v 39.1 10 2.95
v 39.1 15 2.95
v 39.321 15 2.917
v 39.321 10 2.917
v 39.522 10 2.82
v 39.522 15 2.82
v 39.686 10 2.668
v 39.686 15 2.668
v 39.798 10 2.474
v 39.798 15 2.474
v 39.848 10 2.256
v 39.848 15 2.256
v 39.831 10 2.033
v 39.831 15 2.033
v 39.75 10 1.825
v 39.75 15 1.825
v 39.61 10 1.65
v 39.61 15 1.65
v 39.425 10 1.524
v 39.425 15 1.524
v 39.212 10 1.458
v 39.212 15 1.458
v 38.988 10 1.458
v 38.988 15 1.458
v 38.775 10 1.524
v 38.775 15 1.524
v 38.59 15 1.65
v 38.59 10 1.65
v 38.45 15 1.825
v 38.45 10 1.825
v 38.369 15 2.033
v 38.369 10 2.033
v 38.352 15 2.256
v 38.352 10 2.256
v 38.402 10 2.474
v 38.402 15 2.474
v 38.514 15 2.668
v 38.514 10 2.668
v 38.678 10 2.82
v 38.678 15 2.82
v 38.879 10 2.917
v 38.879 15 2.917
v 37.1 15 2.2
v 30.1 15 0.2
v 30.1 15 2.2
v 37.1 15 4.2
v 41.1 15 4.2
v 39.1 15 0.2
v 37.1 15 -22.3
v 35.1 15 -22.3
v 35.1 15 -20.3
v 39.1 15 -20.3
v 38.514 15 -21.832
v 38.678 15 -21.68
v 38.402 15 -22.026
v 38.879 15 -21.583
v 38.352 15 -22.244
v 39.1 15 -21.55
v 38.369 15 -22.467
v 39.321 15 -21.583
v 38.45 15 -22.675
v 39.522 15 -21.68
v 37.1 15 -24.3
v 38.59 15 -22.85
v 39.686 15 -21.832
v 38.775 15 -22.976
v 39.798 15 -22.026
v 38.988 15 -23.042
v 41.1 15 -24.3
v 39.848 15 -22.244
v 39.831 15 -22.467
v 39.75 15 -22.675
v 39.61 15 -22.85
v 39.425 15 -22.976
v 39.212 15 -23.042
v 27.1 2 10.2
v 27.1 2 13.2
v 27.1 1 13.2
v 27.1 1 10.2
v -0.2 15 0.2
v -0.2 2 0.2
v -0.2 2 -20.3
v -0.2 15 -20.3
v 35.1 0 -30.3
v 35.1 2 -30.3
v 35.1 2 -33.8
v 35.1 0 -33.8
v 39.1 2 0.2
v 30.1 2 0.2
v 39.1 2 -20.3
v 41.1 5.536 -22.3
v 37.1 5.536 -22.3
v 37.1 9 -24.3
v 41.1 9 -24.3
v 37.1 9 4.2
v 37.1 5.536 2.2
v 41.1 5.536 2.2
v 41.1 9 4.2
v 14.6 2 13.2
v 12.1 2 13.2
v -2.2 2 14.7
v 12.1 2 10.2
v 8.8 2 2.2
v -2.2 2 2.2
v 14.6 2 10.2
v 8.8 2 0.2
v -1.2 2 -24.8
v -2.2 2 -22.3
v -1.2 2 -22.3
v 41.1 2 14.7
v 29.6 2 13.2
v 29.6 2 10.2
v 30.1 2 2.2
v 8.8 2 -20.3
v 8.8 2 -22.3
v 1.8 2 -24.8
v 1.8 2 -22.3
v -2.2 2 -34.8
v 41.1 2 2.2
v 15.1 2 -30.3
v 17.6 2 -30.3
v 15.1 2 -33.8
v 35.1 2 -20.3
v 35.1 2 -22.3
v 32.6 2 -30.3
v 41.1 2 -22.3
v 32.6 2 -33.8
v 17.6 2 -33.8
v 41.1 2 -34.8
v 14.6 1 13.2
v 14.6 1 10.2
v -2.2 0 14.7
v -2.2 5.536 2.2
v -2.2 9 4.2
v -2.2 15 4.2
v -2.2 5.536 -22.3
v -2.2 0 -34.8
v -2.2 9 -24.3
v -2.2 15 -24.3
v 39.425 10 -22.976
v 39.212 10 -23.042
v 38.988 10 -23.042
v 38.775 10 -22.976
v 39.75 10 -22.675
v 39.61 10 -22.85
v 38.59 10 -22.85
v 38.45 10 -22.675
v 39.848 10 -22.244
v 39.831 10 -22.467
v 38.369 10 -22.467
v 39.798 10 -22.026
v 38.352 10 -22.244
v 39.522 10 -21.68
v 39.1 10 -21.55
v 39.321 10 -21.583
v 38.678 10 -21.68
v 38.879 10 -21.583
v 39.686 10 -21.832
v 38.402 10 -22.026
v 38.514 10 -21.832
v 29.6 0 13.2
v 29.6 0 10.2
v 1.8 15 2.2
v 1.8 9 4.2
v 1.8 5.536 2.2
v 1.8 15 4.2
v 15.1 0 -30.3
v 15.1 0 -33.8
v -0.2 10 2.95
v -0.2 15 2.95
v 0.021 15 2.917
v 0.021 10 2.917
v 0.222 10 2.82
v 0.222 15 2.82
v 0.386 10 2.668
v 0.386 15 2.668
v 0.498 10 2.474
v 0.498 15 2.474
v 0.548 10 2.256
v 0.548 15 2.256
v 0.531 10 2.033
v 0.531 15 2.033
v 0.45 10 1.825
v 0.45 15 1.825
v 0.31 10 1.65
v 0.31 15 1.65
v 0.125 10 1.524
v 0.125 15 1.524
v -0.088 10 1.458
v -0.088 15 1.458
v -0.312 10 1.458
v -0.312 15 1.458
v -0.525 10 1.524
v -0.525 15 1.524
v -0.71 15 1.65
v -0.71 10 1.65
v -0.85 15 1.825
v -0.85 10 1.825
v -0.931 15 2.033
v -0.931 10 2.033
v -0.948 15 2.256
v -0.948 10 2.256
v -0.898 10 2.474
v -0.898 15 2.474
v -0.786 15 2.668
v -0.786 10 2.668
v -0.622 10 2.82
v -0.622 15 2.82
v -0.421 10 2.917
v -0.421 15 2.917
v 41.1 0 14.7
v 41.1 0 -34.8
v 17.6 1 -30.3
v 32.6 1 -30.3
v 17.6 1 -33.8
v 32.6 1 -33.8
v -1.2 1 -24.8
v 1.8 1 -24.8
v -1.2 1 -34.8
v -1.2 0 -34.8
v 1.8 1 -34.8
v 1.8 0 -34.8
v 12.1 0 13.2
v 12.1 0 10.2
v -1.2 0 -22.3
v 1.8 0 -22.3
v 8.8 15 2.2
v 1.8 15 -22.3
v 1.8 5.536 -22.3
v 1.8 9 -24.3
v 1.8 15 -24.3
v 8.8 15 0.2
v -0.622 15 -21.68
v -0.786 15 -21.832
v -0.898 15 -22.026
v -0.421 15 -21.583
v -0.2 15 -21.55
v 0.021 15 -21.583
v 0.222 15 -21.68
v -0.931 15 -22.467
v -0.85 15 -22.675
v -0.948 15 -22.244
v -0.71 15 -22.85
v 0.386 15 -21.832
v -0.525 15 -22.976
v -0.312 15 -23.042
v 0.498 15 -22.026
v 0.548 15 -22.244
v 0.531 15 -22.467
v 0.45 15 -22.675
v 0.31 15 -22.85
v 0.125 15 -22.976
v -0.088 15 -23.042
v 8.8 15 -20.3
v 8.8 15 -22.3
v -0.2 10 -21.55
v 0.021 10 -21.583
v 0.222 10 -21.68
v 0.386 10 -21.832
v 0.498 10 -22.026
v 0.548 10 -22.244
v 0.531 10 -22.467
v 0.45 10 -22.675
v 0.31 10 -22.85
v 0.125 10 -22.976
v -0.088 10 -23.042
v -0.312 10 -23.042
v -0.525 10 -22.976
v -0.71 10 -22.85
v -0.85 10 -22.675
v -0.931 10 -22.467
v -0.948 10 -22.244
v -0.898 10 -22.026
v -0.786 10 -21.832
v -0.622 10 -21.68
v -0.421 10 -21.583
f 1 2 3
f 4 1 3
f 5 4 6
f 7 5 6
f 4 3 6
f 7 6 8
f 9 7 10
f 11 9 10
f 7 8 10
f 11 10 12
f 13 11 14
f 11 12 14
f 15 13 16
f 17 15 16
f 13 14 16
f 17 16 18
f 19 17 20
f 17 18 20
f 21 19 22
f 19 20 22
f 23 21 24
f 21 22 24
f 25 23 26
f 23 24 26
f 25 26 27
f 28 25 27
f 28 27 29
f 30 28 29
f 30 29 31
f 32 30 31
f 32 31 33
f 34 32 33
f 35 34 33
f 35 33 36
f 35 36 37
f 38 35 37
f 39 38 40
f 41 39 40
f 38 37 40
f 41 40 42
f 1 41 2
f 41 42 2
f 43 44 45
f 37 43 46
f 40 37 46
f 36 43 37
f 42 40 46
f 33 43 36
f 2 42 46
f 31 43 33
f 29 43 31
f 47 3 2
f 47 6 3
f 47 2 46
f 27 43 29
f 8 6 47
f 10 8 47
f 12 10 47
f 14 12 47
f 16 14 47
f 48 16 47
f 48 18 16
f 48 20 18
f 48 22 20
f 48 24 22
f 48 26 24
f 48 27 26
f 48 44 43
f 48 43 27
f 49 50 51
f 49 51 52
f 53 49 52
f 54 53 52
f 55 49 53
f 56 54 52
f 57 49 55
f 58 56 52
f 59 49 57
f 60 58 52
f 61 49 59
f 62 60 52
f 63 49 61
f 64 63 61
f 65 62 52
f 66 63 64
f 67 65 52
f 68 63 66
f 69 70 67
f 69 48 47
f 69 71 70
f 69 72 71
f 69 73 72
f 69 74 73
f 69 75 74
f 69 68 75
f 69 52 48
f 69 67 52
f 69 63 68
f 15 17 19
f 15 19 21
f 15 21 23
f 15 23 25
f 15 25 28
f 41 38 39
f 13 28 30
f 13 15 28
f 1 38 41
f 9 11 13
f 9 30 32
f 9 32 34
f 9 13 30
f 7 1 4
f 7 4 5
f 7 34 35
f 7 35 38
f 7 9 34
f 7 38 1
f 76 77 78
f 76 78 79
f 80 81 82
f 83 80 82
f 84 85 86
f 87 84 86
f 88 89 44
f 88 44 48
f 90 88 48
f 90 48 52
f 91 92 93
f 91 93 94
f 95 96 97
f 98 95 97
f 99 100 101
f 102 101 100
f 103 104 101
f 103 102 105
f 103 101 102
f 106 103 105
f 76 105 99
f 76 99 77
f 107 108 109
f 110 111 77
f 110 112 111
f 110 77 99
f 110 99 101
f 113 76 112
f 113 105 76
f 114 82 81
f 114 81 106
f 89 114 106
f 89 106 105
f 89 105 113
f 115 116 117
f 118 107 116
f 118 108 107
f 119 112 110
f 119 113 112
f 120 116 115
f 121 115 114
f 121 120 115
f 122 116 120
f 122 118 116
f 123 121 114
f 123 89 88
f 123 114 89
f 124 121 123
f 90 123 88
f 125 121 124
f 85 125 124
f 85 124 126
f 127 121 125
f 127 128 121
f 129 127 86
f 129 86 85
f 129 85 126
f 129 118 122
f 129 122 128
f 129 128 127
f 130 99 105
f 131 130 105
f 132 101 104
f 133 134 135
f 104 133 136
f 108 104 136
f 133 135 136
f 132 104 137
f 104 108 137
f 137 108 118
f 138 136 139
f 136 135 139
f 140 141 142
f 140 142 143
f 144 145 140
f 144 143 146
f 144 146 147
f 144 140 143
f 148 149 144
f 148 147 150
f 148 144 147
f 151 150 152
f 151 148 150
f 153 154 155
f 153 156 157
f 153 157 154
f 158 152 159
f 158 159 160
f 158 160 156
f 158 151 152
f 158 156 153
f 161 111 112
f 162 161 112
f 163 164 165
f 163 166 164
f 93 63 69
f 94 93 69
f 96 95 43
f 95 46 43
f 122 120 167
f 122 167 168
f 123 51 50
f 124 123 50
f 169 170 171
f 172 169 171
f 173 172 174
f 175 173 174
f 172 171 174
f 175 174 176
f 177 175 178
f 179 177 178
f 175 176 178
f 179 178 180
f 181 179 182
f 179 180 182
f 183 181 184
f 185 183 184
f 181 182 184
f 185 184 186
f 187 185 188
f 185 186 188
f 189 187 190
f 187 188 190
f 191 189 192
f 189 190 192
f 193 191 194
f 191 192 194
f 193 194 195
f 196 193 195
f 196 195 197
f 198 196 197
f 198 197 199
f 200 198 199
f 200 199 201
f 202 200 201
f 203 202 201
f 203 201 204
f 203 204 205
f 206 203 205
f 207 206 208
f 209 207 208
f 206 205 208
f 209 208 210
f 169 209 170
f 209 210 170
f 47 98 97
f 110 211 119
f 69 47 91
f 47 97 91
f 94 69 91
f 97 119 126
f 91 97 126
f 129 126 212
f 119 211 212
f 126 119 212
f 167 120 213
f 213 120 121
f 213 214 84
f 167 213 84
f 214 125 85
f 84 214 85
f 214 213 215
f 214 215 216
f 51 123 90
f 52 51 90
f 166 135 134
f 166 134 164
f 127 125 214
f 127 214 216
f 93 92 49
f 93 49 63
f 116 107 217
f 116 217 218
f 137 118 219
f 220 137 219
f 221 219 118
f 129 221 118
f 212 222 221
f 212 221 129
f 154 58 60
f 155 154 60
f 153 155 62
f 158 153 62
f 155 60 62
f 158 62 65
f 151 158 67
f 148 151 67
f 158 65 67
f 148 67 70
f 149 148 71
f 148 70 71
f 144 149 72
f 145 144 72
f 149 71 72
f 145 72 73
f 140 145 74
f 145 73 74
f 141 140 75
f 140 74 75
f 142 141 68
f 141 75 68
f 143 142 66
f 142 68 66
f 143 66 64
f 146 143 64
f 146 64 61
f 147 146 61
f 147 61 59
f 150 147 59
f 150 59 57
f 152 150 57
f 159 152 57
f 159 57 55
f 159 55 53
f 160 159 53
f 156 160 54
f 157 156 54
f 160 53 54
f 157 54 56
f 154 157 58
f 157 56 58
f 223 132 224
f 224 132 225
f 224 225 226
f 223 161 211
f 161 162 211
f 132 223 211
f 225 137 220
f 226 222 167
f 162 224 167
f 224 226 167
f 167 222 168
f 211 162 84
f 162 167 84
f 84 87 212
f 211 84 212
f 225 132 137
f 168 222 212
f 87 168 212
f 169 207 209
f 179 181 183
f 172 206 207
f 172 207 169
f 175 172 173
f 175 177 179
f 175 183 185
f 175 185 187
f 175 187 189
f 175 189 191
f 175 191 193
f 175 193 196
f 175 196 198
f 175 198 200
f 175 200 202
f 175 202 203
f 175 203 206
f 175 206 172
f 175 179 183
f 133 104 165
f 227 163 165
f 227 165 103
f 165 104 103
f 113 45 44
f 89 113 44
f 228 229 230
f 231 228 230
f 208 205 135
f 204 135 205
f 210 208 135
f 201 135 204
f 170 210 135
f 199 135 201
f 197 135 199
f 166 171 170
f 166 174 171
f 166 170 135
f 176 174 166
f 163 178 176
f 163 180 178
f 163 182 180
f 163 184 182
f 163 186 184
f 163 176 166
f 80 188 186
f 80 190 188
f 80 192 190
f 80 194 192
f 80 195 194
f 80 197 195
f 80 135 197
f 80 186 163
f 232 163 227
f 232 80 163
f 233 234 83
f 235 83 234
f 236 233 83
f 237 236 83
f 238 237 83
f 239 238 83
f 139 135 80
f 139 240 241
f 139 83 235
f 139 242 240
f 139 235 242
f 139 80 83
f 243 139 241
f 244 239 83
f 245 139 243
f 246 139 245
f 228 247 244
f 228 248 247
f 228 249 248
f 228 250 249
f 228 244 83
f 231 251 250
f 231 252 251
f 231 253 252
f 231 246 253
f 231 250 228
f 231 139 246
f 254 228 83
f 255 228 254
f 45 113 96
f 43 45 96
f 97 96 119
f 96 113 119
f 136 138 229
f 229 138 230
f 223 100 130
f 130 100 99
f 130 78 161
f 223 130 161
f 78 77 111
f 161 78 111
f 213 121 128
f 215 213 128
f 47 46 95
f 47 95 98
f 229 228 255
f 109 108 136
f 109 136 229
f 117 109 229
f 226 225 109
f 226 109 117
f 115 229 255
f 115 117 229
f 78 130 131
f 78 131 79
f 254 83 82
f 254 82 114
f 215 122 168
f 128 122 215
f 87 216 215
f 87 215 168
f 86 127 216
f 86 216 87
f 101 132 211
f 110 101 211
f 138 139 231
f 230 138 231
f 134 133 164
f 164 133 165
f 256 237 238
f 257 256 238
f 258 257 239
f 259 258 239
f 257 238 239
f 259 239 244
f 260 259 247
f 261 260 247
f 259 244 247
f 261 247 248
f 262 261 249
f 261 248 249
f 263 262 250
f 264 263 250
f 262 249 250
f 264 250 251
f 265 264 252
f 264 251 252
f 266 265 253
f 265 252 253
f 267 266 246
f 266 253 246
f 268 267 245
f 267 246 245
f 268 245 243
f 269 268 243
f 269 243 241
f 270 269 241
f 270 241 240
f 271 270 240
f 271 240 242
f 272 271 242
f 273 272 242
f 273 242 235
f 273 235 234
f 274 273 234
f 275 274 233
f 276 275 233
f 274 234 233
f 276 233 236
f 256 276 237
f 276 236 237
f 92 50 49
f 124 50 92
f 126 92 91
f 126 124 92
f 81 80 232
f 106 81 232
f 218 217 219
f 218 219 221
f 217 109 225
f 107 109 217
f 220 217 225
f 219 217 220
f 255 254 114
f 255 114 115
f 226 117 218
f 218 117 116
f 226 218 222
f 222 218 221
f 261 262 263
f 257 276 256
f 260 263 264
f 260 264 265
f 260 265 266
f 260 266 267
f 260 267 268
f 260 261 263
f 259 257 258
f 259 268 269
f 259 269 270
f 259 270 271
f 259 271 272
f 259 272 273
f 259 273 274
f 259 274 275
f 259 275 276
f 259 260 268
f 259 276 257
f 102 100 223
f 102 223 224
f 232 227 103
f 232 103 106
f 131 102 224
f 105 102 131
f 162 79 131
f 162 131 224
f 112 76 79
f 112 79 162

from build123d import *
from OCP.BRepFilletAPI import BRepFilletAPI_MakeChamfer

# Parameters (mm, degrees)
SKETCH1_W           = 43.3
SKETCH1_H           = 24.5
SKETCH1_W_2         = 39.3
SKETCH1_H_2         = 20.5
SKETCH1_H_3         = 12.5
BOSS_EXTRUDE1_DEPTH = 2
SKETCH1_3_W         = 43.3
SKETCH1_3_H         = 24.5
SKETCH1_3_W_2       = 39.3
SKETCH1_3_H_2       = 20.5
BOSS_EXTRUDE2_DEPTH = 15
SKETCH3_W           = 4
SKETCH3_H           = 2
BOSS_EXTRUDE4_DEPTH = 6
CHAMFER2_SIZE       = 3.464101615
CHAMFER2_SIZE_2     = 2
SKETCH4_R           = 0.75
CUT_EXTRUDE1_DEPTH  = 5
SKETCH5_W           = 26.3
SKETCH5_H           = 2
SKETCH5_W_2         = 21.3
CUT_EXTRUDE2_DEPTH  = 13
SKETCH7_W           = 2.5
SKETCH7_H           = 3.5
SKETCH7_H_2         = 3
CUT_EXTRUDE3_DEPTH  = 56.400812268
SKETCH8_W           = 15
SKETCH8_H           = 3.5
SKETCH8_W_2         = 12.5
SKETCH8_H_2         = 3
CUT_EXTRUDE4_DEPTH  = 1
SKETCH9_W           = 3
SKETCH9_H           = 2.5
CUT_EXTRUDE5_DEPTH  = 56.400812268
SKETCH10_W          = 3
SKETCH10_H          = 10
CUT_EXTRUDE6_DEPTH  = 1


with BuildPart() as part:
    # Sketch1 → Boss-Extrude1 (new body)
    # profile 1 of 4: a face of its own
    with BuildSketch(Plane(origin=(0, 0, 0), x_dir=(1, 0, 0), z_dir=(0, 1, 0))):
        with Locations((19.45, 10.05)):
            Rectangle(SKETCH1_W, SKETCH1_H)
        with Locations((19.45, 10.05)):
            Rectangle(SKETCH1_W_2, SKETCH1_H_2, mode=Mode.SUBTRACT)
    # profile 2 of 4: a face of its own
    with BuildSketch(Plane(origin=(0, 0, 0), x_dir=(1, 0, 0), z_dir=(0, 1, 0))):
        with Locations((19.45, 10.05)):
            Rectangle(SKETCH1_W_2, SKETCH1_H_2)
    # profile 3 of 4: a face of its own
    with BuildSketch(Plane(origin=(0, 0, 0), x_dir=(1, 0, 0), z_dir=(0, 1, 0))):
        with Locations((19.45, -8.45)):
            Rectangle(SKETCH1_W, SKETCH1_H_3)
    # profile 4 of 4: a face of its own
    with BuildSketch(Plane(origin=(0, 0, 0), x_dir=(1, 0, 0), z_dir=(0, 1, 0))):
        with Locations((19.45, 28.55)):
            Rectangle(SKETCH1_W, SKETCH1_H_3)
    extrude(amount=BOSS_EXTRUDE1_DEPTH)

    # Sketch1<3> → Boss-Extrude2 (add)
    with BuildSketch(Plane(origin=(0, 0, 0), x_dir=(1, 0, 0), z_dir=(0, 1, 0))):
        with Locations((19.45, 10.05)):
            Rectangle(SKETCH1_3_W, SKETCH1_3_H)
        with Locations((19.45, 10.05)):
            Rectangle(SKETCH1_3_W_2, SKETCH1_3_H_2, mode=Mode.SUBTRACT)
    extrude(amount=BOSS_EXTRUDE2_DEPTH)

    # Sketch3 → Boss-Extrude4 (add)
    with BuildSketch(Plane(origin=(0, 15, 0), x_dir=(1, 0, 0), z_dir=(0, 1, 0))):
        with Locations((-0.2, -3.2)):
            Rectangle(SKETCH3_W, SKETCH3_H)
        with Locations((39.1, -3.2)):
            Rectangle(SKETCH3_W, SKETCH3_H)
        with Locations((39.1, 23.3)):
            Rectangle(SKETCH3_W, SKETCH3_H)
        with Locations((-0.2, 23.3)):
            Rectangle(SKETCH3_W, SKETCH3_H)
    extrude(amount=-BOSS_EXTRUDE4_DEPTH)

    # Chamfer2
    chamfer2_edges_1 = [part.edges().sort_by_distance(p)[0] for p in [
        (-0.2, 9, -22.3),
    ]]
    chamfer2_side_1 = [part.faces().sort_by_distance(p)[0] for p in [
        (-0.2, 8.96, -22.3),
    ]]
    chamfer2_edges_2 = [part.edges().sort_by_distance(p)[0] for p in [
        (39.1, 9, -22.3),
    ]]
    chamfer2_side_2 = [part.faces().sort_by_distance(p)[0] for p in [
        (39.1, 9, -22.34),
    ]]
    chamfer2_edges_3 = [part.edges().sort_by_distance(p)[0] for p in [
        (39.1, 9, 2.2),
    ]]
    chamfer2_side_3 = [part.faces().sort_by_distance(p)[0] for p in [
        (39.1, 9, 2.24),
    ]]
    chamfer2_edges_4 = [part.edges().sort_by_distance(p)[0] for p in [
        (-0.2, 9, 2.2),
    ]]
    chamfer2_side_4 = [part.faces().sort_by_distance(p)[0] for p in [
        (-0.2, 9, 2.24),
    ]]
    chamfer2 = BRepFilletAPI_MakeChamfer(part.part.solid().wrapped)
    for e in chamfer2_edges_1:
        chamfer2.Add(CHAMFER2_SIZE - 0.0001, CHAMFER2_SIZE_2 - 0.0001, e.wrapped, chamfer2_side_1[0].wrapped)
    for e in chamfer2_edges_2:
        chamfer2.Add(CHAMFER2_SIZE_2 - 0.0001, CHAMFER2_SIZE - 0.0001, e.wrapped, chamfer2_side_2[0].wrapped)
    for e in chamfer2_edges_3:
        chamfer2.Add(CHAMFER2_SIZE_2 - 0.0001, CHAMFER2_SIZE - 0.0001, e.wrapped, chamfer2_side_3[0].wrapped)
    for e in chamfer2_edges_4:
        chamfer2.Add(CHAMFER2_SIZE_2 - 0.0001, CHAMFER2_SIZE - 0.0001, e.wrapped, chamfer2_side_4[0].wrapped)
    add(Compound.cast(chamfer2.Shape()), mode=Mode.REPLACE)  # a hair under: the kernel refuses the full size

    # Sketch4 → Cut-Extrude1 (cut)
    with BuildSketch(Plane(origin=(0, 15, 0), x_dir=(1, 0, 0), z_dir=(0, 1, 0))):
        with Locations(Location((-0.2, 22.3, 0), (0, 0, 270))):
            Circle(SKETCH4_R)
        with Locations(Location((-0.2, -2.2, 0), (0, 0, 270))):
            Circle(SKETCH4_R)
        with Locations(Location((39.1, -2.2, 0), (0, 0, 270))):
            Circle(SKETCH4_R)
        with Locations(Location((39.1, 22.3, 0), (0, 0, 270))):
            Circle(SKETCH4_R)
    extrude(amount=-CUT_EXTRUDE1_DEPTH, mode=Mode.SUBTRACT)

    # Sketch5 → Cut-Extrude2 (cut)
    with BuildSketch(Plane(origin=(0, 15, 0), x_dir=(1, 0, 0), z_dir=(0, 1, 0))):
        with Locations((21.95, 21.3)):
            Rectangle(SKETCH5_W, SKETCH5_H)
        with Locations((19.45, -1.2)):
            Rectangle(SKETCH5_W_2, SKETCH5_H)
    extrude(amount=-CUT_EXTRUDE2_DEPTH, mode=Mode.SUBTRACT)

    # Sketch7 → Cut-Extrude3 (cut, through all)
    with BuildSketch(Plane(origin=(0, 2, 0), x_dir=(1, 0, 0), z_dir=(0, 1, 0))):
        with Locations((16.35, 32.05)):
            Rectangle(SKETCH7_W, SKETCH7_H)
        with Locations((33.85, 32.05)):
            Rectangle(SKETCH7_W, SKETCH7_H)
        with Locations((13.35, -11.7)):
            Rectangle(SKETCH7_W, SKETCH7_H_2)
        with Locations((28.35, -11.7)):
            Rectangle(SKETCH7_W, SKETCH7_H_2)
    extrude(amount=-CUT_EXTRUDE3_DEPTH, mode=Mode.SUBTRACT)

    # Sketch8 → Cut-Extrude4 (cut)
    with BuildSketch(Plane.XZ):
        with Locations((25.1, -32.05)):
            Rectangle(SKETCH8_W, SKETCH8_H)
        with Locations((20.85, 11.7)):
            Rectangle(SKETCH8_W_2, SKETCH8_H_2)
    extrude(amount=-CUT_EXTRUDE4_DEPTH, mode=Mode.SUBTRACT)

    # Sketch9 → Cut-Extrude5 (cut, through all)
    with BuildSketch(Plane(origin=(0, 2, 0), x_dir=(1, 0, 0), z_dir=(0, 1, 0))):
        with Locations((0.3, 23.55)):
            Rectangle(SKETCH9_W, SKETCH9_H)
    extrude(amount=-CUT_EXTRUDE5_DEPTH, mode=Mode.SUBTRACT)

    # Sketch10 → Cut-Extrude6 (cut)
    with BuildSketch(Plane.XZ):
        with Locations((0.3, -29.8)):
            Rectangle(SKETCH10_W, SKETCH10_H)
    extrude(amount=-CUT_EXTRUDE6_DEPTH, mode=Mode.SUBTRACT)


solid = part.part
